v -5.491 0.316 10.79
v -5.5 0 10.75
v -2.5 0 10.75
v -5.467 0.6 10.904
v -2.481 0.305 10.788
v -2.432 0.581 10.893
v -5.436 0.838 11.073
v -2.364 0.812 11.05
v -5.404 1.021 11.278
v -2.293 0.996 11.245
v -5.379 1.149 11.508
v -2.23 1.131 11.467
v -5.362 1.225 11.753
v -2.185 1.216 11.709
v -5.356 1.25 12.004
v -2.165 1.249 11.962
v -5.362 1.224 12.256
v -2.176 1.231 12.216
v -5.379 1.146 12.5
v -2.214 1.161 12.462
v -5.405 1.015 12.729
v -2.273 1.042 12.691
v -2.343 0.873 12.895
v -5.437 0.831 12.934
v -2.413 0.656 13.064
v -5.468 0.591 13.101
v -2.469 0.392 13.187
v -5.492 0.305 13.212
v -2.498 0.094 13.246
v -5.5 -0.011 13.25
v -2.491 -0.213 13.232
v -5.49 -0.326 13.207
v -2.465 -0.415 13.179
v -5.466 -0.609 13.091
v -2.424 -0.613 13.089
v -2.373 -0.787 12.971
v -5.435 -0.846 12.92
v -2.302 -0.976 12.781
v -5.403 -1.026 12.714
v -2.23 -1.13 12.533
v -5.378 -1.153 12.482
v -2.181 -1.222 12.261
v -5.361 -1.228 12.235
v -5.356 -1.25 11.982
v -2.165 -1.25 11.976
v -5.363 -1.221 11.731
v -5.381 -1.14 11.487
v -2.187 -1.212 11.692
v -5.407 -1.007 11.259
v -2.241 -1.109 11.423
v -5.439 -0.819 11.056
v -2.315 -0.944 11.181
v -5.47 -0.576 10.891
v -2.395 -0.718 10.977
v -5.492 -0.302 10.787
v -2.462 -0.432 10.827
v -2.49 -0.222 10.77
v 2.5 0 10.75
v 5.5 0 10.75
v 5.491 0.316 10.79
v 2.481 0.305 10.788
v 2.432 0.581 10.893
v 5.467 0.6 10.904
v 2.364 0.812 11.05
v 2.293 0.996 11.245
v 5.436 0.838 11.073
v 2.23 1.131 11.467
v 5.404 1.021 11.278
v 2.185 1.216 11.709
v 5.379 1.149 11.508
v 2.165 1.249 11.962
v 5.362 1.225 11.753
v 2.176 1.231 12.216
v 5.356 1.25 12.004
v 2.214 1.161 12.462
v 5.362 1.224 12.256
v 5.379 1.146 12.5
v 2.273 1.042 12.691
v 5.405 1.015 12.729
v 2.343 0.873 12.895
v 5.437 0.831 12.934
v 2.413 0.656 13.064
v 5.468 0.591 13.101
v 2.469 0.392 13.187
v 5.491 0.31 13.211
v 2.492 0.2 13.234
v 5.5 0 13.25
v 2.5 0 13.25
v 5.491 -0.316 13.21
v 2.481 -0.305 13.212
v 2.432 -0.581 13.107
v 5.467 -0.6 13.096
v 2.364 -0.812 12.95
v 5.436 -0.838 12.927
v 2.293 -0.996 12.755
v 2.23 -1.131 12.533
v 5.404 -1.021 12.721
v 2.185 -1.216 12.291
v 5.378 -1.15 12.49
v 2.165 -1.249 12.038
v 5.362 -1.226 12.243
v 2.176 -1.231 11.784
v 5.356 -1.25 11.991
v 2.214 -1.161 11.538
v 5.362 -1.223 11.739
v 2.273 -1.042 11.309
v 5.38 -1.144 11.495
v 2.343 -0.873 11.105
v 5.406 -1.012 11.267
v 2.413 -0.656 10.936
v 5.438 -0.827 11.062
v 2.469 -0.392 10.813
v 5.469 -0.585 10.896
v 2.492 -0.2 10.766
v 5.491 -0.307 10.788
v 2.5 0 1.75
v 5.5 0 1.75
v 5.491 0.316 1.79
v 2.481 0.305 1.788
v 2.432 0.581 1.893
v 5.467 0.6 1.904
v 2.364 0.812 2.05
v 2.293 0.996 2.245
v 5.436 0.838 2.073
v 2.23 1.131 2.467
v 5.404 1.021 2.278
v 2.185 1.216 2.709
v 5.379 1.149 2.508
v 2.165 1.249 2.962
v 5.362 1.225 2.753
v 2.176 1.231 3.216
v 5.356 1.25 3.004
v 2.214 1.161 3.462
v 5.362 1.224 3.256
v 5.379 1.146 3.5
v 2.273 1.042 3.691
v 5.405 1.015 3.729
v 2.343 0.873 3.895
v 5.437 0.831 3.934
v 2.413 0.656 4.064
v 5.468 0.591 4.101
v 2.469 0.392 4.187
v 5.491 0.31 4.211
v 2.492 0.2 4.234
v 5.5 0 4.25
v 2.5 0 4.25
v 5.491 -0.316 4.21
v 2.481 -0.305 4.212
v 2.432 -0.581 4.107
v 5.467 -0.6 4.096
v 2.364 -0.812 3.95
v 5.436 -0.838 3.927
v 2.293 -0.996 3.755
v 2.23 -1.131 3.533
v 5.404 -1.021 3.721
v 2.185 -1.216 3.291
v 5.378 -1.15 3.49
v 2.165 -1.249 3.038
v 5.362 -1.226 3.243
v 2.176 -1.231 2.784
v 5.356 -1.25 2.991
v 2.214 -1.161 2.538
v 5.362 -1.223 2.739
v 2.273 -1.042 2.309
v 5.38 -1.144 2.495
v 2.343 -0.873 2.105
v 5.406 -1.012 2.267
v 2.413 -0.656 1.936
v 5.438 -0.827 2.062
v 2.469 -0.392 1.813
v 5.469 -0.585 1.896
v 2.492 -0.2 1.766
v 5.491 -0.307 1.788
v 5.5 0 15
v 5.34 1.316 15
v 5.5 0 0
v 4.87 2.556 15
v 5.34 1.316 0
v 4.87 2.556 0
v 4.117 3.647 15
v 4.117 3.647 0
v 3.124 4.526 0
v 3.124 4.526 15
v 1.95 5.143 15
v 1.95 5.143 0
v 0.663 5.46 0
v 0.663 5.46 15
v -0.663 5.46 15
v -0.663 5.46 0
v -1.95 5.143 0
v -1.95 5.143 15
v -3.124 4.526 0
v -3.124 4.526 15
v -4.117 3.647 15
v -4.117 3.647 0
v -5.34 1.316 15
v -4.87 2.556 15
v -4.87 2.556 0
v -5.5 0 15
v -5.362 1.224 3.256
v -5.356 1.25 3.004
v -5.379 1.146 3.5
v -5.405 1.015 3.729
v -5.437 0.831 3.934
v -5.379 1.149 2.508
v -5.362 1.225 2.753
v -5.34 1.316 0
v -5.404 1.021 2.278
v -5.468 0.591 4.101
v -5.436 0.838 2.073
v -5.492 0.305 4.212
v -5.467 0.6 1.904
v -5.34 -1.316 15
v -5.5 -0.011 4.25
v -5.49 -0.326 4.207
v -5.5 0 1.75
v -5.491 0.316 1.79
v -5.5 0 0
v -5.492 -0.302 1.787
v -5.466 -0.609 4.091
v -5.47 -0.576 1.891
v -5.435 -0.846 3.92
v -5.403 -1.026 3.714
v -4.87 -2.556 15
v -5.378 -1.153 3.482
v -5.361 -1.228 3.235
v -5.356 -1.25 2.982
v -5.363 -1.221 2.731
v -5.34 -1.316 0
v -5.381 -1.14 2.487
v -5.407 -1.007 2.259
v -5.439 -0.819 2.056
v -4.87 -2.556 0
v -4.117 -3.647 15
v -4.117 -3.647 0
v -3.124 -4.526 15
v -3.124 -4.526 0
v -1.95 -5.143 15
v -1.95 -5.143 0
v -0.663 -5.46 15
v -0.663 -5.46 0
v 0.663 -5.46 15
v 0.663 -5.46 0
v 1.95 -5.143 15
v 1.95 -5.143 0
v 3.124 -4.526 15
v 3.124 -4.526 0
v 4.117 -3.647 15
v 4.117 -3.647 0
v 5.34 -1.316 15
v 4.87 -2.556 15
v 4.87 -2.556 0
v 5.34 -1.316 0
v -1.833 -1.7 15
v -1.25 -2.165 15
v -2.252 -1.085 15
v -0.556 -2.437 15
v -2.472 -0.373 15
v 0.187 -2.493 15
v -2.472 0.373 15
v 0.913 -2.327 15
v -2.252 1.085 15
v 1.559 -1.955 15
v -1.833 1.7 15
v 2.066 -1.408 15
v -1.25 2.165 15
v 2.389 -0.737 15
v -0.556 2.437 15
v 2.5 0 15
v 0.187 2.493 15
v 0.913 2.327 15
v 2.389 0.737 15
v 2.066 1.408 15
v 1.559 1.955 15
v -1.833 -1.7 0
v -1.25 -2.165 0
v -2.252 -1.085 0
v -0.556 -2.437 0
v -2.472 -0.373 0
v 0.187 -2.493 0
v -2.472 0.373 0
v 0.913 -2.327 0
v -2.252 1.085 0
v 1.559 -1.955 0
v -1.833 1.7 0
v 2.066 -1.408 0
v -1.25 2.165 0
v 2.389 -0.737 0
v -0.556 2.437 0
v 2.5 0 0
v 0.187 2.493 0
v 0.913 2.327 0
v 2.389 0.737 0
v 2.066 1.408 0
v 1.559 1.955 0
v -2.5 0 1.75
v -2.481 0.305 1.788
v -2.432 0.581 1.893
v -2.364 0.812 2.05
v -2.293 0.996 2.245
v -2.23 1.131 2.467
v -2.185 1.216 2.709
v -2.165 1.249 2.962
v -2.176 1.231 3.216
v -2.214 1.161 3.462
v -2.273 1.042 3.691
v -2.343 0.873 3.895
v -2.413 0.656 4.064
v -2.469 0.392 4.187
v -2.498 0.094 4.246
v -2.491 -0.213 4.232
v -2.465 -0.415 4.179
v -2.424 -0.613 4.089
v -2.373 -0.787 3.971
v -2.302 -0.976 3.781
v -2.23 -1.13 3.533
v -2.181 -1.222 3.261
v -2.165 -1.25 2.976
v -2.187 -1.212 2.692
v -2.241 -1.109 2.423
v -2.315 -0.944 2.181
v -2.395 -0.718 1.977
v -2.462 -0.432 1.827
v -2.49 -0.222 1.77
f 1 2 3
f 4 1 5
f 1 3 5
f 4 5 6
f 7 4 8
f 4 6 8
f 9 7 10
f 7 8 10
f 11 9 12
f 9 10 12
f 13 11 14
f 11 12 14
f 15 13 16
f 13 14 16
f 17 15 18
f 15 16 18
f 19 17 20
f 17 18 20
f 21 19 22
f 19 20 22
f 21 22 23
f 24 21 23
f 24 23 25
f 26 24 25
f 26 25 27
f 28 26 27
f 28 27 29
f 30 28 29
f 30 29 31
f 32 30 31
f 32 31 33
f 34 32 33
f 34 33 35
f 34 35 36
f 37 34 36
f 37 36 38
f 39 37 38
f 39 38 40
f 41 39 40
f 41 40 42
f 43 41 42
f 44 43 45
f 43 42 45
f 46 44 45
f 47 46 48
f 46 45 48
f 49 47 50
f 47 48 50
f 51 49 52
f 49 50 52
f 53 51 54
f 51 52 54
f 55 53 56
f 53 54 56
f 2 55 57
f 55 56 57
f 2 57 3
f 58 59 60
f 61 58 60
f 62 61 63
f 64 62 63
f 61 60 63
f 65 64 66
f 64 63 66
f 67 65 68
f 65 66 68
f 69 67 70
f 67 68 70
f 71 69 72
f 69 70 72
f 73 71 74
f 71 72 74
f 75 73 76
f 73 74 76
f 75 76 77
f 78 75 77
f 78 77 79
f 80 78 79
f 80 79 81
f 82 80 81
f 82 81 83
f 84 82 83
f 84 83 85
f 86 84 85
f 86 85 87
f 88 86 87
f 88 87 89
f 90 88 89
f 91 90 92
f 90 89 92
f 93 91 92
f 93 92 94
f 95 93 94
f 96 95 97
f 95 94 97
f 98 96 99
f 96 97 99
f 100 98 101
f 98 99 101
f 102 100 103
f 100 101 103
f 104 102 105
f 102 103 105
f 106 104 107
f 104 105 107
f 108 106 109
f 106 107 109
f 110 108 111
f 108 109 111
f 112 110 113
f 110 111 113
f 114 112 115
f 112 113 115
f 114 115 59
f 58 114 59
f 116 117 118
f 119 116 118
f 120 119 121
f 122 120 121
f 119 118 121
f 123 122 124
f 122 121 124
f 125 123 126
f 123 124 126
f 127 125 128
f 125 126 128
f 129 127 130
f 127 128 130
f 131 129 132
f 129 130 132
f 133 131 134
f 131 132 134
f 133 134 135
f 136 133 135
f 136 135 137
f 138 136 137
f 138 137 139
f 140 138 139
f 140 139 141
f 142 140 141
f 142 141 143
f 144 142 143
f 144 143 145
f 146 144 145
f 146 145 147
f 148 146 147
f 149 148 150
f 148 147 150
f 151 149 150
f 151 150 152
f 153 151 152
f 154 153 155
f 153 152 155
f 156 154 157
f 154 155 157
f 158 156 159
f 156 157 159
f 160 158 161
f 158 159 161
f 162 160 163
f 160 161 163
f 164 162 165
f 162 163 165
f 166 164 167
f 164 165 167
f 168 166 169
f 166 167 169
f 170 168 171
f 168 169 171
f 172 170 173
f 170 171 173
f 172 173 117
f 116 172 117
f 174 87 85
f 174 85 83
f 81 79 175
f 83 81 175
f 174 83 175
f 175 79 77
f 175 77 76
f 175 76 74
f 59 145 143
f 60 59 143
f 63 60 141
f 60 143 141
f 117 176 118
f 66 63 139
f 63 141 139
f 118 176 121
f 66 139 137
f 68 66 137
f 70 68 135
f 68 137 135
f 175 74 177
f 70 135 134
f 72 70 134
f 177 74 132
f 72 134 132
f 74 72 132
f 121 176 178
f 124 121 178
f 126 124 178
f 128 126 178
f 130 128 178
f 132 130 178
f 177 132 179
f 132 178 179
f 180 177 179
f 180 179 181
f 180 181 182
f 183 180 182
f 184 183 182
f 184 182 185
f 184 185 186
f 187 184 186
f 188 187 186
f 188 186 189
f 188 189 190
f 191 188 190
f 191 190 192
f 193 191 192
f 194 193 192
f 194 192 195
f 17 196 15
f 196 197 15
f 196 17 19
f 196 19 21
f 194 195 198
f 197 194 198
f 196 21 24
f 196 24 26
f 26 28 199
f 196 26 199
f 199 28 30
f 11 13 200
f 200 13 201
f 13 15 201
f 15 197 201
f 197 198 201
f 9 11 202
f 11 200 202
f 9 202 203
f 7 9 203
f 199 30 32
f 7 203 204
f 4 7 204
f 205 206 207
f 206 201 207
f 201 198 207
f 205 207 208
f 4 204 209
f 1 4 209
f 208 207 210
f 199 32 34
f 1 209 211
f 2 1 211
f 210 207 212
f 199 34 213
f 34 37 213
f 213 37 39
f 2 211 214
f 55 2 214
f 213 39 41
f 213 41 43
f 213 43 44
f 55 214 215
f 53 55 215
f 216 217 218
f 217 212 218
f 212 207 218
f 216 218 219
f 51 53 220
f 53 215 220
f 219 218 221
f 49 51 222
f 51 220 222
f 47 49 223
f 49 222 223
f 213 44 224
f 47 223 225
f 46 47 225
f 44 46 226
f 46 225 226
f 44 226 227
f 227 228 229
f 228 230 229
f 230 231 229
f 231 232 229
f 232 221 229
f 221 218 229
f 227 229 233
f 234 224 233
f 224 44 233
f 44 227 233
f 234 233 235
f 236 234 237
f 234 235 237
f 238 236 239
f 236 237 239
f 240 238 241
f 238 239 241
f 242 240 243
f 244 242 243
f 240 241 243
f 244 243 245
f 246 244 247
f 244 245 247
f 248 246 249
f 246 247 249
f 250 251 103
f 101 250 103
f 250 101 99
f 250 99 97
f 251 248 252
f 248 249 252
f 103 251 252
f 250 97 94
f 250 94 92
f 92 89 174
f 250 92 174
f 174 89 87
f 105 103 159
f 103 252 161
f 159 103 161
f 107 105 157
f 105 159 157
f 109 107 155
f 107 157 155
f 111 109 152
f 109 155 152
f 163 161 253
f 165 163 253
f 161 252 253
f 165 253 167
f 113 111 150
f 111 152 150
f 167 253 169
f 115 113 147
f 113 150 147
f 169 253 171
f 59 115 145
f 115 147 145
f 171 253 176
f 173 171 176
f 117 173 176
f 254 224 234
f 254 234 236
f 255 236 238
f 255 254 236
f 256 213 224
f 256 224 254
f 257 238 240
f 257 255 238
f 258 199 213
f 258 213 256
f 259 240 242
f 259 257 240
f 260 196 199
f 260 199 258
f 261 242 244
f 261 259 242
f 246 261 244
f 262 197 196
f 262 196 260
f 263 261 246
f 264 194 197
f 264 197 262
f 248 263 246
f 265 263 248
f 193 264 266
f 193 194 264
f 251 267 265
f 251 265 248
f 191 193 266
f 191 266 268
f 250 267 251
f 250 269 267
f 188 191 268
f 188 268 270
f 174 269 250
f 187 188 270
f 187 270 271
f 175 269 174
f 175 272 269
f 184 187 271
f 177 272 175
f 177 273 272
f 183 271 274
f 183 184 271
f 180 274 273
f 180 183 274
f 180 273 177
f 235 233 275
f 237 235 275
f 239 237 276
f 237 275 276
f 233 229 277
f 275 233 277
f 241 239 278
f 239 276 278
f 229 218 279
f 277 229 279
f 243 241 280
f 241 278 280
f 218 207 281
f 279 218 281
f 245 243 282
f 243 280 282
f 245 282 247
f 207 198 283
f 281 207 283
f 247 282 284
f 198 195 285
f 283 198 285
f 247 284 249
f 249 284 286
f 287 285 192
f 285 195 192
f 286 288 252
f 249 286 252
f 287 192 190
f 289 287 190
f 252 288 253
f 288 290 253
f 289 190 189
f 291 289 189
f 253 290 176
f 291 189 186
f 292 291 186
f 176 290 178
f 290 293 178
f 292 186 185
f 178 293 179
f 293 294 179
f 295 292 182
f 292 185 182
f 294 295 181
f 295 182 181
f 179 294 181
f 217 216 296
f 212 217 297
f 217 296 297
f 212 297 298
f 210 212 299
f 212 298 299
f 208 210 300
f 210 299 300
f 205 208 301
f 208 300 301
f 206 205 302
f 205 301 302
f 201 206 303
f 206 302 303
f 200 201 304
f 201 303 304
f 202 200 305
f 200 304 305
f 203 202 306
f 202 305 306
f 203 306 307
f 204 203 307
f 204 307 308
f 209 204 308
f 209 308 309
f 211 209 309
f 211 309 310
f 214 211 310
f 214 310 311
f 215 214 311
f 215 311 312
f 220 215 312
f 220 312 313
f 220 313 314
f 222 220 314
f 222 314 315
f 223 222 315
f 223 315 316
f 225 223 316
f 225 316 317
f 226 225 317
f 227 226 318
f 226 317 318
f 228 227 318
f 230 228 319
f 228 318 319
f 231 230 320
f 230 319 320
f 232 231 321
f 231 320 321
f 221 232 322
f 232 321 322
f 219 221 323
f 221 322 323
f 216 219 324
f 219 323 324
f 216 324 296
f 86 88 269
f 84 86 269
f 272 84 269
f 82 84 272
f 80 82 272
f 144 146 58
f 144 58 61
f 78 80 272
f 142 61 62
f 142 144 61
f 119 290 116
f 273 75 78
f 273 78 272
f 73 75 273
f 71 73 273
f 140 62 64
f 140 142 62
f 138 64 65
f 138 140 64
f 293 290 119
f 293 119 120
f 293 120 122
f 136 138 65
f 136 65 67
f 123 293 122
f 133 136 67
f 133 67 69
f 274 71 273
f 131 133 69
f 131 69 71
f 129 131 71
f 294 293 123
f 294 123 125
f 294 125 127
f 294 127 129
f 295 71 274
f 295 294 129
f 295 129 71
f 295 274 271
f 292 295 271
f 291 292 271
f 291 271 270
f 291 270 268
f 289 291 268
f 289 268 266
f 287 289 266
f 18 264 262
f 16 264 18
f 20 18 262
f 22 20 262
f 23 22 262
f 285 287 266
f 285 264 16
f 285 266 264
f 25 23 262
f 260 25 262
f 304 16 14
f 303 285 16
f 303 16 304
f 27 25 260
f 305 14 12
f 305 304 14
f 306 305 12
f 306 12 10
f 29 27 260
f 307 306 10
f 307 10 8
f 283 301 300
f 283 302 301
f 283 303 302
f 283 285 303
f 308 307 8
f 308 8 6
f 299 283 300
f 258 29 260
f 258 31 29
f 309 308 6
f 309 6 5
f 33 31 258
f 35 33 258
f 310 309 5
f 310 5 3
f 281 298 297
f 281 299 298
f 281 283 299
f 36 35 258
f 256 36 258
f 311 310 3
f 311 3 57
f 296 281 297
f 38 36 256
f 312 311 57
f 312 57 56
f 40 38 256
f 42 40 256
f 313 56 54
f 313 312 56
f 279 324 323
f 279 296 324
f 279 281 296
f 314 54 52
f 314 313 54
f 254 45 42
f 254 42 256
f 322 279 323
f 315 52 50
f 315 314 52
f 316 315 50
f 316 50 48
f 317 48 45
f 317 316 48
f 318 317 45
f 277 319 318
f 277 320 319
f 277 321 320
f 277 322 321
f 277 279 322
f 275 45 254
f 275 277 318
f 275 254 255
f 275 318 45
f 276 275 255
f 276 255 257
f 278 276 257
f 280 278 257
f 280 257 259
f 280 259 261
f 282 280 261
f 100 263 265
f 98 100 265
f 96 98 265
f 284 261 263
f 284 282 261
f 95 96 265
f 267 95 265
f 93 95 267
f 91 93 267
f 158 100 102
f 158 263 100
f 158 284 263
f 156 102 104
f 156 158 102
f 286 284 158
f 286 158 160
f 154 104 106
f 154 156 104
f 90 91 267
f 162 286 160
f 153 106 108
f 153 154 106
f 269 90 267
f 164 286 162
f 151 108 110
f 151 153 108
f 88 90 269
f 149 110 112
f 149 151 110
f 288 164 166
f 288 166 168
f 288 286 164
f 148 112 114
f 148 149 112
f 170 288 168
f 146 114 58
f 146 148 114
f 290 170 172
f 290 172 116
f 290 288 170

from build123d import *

# Parameters (mm, degrees)
SKETCH_1_R        = 5.5
SKETCH_1_R_2      = 2.5
EXTRUDE_1_DEPTH   = 15
HOLE_WIZARD_M31_D = 2.5


with BuildPart() as part:
    # Эскиз1 → Бобышка-Вытянуть1 (new body)
    with BuildSketch(Plane.XY):
        Circle(SKETCH_1_R)
        Circle(SKETCH_1_R_2, mode=Mode.SUBTRACT)
    extrude(amount=EXTRUDE_1_DEPTH)

    # Отверстие обработанное метчиком M31 (through all)
    with Locations(Plane.ZY.offset(5.5)):
        with Locations((12, 0), (3, 0)):
            Hole(HOLE_WIZARD_M31_D / 2)


solid = part.part
